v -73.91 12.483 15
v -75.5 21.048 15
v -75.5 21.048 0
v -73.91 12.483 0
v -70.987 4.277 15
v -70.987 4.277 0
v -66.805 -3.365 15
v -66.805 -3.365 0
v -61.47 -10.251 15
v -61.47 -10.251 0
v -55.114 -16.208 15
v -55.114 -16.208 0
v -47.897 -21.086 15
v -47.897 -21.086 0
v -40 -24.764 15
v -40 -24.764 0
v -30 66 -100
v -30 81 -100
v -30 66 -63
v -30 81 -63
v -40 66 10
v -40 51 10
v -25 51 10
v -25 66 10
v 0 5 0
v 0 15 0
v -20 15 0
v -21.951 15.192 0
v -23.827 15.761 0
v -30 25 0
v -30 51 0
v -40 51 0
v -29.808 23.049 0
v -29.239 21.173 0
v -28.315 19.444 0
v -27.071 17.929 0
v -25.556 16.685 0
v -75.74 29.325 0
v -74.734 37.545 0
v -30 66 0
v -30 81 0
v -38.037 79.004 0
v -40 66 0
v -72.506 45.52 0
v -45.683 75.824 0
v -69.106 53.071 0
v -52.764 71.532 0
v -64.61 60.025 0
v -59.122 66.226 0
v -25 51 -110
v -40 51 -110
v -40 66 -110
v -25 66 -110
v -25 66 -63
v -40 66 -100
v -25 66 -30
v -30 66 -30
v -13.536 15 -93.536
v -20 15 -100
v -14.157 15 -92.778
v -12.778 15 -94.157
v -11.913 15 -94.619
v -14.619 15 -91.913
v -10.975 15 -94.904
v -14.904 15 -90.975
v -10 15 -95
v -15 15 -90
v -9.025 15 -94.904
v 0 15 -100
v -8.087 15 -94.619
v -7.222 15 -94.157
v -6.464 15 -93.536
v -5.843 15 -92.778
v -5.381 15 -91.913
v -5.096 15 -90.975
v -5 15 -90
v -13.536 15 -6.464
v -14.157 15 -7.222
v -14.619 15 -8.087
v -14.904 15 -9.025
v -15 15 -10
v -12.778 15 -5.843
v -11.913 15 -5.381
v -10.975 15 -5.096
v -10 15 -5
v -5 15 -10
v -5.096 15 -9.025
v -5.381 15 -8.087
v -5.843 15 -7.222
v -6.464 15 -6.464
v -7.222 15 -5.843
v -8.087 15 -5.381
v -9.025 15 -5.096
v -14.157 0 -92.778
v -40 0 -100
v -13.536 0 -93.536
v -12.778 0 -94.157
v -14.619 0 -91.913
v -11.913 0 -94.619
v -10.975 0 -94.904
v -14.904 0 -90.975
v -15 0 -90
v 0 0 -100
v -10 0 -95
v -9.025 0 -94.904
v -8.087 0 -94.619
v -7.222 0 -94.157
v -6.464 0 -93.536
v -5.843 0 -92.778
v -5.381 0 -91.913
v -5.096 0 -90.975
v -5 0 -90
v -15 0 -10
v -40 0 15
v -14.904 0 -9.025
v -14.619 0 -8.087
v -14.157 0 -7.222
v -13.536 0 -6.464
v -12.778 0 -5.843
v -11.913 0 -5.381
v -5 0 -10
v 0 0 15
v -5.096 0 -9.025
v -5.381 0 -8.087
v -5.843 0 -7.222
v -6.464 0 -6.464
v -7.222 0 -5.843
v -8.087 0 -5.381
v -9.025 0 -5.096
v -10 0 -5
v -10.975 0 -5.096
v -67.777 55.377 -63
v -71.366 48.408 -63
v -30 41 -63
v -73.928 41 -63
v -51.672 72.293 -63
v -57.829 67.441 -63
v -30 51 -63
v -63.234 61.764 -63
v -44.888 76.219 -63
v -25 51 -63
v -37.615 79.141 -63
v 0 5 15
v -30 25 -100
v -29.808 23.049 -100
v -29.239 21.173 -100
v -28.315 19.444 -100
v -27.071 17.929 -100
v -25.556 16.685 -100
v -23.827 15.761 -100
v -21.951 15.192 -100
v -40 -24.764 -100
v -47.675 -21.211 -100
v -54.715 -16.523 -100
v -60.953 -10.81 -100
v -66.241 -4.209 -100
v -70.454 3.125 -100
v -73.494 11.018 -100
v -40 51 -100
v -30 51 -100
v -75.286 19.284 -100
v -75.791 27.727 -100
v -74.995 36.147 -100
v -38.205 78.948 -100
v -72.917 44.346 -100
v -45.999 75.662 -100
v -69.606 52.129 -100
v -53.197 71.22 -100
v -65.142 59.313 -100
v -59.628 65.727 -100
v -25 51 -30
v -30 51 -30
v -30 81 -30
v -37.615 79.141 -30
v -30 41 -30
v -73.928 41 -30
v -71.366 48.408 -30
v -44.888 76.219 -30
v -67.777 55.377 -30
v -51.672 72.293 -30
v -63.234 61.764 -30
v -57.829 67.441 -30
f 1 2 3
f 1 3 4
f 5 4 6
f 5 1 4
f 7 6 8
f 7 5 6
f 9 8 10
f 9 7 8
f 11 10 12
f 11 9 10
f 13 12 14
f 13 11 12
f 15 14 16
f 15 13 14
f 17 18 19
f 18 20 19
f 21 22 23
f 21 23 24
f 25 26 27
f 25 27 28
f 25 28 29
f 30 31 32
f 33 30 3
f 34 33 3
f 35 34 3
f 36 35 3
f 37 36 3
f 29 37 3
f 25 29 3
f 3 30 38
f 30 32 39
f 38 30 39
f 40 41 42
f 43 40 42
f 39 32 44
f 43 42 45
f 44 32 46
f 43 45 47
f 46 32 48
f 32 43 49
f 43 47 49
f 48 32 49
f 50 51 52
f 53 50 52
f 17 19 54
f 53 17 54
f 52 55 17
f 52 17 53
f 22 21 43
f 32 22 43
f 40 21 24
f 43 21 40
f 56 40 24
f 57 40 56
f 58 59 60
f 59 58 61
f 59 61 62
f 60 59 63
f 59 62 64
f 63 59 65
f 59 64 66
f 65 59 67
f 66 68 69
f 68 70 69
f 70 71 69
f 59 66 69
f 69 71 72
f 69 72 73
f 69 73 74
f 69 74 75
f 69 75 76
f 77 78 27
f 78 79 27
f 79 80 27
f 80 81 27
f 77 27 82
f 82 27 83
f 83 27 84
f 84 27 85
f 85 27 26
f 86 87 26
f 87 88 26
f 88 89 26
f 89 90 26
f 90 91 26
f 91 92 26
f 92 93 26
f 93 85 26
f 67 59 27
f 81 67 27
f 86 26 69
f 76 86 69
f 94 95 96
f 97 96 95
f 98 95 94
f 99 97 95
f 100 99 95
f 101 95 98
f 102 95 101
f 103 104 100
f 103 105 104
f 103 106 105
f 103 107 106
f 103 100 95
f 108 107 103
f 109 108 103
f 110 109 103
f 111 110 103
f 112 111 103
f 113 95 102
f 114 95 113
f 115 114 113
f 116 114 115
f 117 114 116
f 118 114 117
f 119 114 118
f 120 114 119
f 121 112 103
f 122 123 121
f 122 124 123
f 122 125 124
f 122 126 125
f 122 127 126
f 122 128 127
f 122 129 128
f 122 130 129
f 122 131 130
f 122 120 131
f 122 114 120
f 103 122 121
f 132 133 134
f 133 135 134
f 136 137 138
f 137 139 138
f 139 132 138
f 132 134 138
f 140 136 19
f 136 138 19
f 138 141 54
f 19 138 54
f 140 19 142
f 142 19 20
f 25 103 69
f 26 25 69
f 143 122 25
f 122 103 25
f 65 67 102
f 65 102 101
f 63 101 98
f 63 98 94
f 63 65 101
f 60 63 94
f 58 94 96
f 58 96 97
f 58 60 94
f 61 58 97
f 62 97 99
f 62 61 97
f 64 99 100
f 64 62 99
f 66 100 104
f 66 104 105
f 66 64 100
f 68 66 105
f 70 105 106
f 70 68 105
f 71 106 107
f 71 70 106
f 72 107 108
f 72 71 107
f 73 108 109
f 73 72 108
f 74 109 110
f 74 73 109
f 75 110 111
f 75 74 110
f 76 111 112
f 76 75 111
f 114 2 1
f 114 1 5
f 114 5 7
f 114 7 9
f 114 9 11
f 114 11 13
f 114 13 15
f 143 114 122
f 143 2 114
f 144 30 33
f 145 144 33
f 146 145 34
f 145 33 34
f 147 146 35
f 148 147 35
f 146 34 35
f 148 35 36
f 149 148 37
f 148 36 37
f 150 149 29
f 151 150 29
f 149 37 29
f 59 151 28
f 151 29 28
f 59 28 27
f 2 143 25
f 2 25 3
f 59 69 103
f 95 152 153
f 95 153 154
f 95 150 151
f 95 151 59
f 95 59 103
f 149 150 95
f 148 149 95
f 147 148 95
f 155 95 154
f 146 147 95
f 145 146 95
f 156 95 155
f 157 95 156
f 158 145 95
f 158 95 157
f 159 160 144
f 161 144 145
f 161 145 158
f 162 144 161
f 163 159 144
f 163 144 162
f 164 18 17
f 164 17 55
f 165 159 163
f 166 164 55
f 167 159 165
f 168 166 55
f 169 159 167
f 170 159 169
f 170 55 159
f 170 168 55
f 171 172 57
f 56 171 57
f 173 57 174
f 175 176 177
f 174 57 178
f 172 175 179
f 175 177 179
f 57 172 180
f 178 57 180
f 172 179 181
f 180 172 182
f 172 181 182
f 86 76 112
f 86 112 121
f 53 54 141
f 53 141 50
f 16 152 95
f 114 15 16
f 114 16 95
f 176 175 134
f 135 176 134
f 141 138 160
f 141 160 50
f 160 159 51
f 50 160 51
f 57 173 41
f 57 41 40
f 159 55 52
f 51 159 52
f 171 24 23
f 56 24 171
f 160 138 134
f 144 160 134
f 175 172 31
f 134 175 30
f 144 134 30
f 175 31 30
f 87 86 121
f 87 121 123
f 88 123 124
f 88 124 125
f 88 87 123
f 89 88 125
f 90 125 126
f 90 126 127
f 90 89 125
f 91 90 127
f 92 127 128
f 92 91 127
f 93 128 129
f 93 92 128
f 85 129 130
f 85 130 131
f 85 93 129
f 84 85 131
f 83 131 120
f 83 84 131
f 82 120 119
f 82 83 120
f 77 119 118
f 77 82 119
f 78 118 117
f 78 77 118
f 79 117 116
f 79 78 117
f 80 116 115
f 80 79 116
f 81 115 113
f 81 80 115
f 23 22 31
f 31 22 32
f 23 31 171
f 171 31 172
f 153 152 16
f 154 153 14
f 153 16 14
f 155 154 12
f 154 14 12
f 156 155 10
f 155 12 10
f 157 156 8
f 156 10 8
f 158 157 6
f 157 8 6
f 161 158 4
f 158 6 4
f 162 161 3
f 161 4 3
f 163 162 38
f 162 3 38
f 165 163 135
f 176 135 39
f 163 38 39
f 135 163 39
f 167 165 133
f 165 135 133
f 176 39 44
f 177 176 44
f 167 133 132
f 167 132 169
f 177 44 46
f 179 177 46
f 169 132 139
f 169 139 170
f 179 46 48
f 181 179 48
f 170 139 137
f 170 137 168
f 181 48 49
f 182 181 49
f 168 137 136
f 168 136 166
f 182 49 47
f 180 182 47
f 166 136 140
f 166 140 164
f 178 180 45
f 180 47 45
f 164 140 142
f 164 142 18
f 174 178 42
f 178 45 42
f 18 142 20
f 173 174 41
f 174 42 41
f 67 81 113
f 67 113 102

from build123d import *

# Parameters (mm, degrees)
BOSS_EXTRUDE1_DEPTH      = 100
BOSS_EXTRUDE2_START      = 15
BOSS_EXTRUDE2_DEPTH      = 15
CUT_EXTRUDE1_DEPTH       = 15
SKETCH4_W                = 33
SKETCH4_H                = 40
CUT_EXTRUDE2_DEPTH       = 137.596313355
BOSS_EXTRUDE3_DEPTH      = 5
BOSS_EXTRUDE3_DEPTH_BACK = 10
SKETCH5_W                = 47
SKETCH5_H                = 15
BOSS_EXTRUDE4_DEPTH      = 5
BOSS_EXTRUDE4_DEPTH_BACK = 10
SKETCH6_W                = 40
SKETCH6_H                = 15


with BuildPart() as part:
    # Sketch1 → Boss-Extrude1 (new body)
    with BuildSketch(Plane.XY):
        with BuildLine():
            Line((0, 0), (-40, 0))
            Line((-40, 0), (-40, -24.764457872))
            ThreePointArc((-40, -24.764457872), (-75.554844009, 31.952220257), (-30, 81))
            Line((-30, 81), (-30, 25))
            ThreePointArc((-30, 25), (-27.071067812, 17.928932188), (-20, 15))
            Line((-20, 15), (0, 15))
            Line((0, 15), (0, 0))
        make_face()
    extrude(amount=-BOSS_EXTRUDE1_DEPTH)

    # Sketch2 → Boss-Extrude2 (add)
    with BuildSketch(Plane.XY.offset(BOSS_EXTRUDE2_START)):
        with BuildLine():
            Line((0, 0), (0, 5))
            Line((0, 5), (-75.500062866, 21.048033769))
            ThreePointArc((-75.500062866, 21.048033769), (-64.273998003, -6.913628491), (-40, -24.764457872))
            Line((-40, -24.764457872), (-40, 0))
            Line((-40, 0), (0, 0))
        make_face()
    extrude(amount=-BOSS_EXTRUDE2_DEPTH)

    # Sketch3 → Cut-Extrude1 (cut)
    with BuildSketch(Plane(origin=(0, 15, 0), x_dir=(1, 0, 0), z_dir=(0, 1, 0))):
        with BuildLine():
            Line((-5, 90), (-5, 10))
            ThreePointArc((-5, 10), (-10, 5), (-15, 10))
            Line((-15, 10), (-15, 90))
            ThreePointArc((-15, 90), (-10, 95), (-5, 90))
        make_face()
    extrude(amount=-CUT_EXTRUDE1_DEPTH, mode=Mode.SUBTRACT)

    # Sketch4 → Cut-Extrude2 (cut, through all)
    with BuildSketch(Plane(origin=(-30, 0, 0), x_dir=(0, 0, -1), z_dir=(1, 0, 0))):
        with Locations((46.5, 61)):
            Rectangle(SKETCH4_W, SKETCH4_H)
    extrude(amount=-CUT_EXTRUDE2_DEPTH, mode=Mode.SUBTRACT)

    # Sketch5 → Boss-Extrude3 (add, two sides: drawn at the far end of the back side and taken through both)
    with BuildSketch(Plane(origin=(-30, 0, 0), x_dir=(0, 0, -1), z_dir=(1, 0, 0)).offset(-BOSS_EXTRUDE3_DEPTH_BACK)):
        with Locations((86.5, 58.5)):
            Rectangle(SKETCH5_W, SKETCH5_H)
    extrude(amount=BOSS_EXTRUDE3_DEPTH + BOSS_EXTRUDE3_DEPTH_BACK)

    # Sketch6 → Boss-Extrude4 (add, two sides: drawn at the far end of the back side and taken through both)
    with BuildSketch(Plane(origin=(-30, 0, 0), x_dir=(0, 0, -1), z_dir=(1, 0, 0)).offset(-BOSS_EXTRUDE4_DEPTH_BACK)):
        with Locations((10, 58.5)):
            Rectangle(SKETCH6_W, SKETCH6_H)
    extrude(amount=BOSS_EXTRUDE4_DEPTH + BOSS_EXTRUDE4_DEPTH_BACK)


solid = part.part
